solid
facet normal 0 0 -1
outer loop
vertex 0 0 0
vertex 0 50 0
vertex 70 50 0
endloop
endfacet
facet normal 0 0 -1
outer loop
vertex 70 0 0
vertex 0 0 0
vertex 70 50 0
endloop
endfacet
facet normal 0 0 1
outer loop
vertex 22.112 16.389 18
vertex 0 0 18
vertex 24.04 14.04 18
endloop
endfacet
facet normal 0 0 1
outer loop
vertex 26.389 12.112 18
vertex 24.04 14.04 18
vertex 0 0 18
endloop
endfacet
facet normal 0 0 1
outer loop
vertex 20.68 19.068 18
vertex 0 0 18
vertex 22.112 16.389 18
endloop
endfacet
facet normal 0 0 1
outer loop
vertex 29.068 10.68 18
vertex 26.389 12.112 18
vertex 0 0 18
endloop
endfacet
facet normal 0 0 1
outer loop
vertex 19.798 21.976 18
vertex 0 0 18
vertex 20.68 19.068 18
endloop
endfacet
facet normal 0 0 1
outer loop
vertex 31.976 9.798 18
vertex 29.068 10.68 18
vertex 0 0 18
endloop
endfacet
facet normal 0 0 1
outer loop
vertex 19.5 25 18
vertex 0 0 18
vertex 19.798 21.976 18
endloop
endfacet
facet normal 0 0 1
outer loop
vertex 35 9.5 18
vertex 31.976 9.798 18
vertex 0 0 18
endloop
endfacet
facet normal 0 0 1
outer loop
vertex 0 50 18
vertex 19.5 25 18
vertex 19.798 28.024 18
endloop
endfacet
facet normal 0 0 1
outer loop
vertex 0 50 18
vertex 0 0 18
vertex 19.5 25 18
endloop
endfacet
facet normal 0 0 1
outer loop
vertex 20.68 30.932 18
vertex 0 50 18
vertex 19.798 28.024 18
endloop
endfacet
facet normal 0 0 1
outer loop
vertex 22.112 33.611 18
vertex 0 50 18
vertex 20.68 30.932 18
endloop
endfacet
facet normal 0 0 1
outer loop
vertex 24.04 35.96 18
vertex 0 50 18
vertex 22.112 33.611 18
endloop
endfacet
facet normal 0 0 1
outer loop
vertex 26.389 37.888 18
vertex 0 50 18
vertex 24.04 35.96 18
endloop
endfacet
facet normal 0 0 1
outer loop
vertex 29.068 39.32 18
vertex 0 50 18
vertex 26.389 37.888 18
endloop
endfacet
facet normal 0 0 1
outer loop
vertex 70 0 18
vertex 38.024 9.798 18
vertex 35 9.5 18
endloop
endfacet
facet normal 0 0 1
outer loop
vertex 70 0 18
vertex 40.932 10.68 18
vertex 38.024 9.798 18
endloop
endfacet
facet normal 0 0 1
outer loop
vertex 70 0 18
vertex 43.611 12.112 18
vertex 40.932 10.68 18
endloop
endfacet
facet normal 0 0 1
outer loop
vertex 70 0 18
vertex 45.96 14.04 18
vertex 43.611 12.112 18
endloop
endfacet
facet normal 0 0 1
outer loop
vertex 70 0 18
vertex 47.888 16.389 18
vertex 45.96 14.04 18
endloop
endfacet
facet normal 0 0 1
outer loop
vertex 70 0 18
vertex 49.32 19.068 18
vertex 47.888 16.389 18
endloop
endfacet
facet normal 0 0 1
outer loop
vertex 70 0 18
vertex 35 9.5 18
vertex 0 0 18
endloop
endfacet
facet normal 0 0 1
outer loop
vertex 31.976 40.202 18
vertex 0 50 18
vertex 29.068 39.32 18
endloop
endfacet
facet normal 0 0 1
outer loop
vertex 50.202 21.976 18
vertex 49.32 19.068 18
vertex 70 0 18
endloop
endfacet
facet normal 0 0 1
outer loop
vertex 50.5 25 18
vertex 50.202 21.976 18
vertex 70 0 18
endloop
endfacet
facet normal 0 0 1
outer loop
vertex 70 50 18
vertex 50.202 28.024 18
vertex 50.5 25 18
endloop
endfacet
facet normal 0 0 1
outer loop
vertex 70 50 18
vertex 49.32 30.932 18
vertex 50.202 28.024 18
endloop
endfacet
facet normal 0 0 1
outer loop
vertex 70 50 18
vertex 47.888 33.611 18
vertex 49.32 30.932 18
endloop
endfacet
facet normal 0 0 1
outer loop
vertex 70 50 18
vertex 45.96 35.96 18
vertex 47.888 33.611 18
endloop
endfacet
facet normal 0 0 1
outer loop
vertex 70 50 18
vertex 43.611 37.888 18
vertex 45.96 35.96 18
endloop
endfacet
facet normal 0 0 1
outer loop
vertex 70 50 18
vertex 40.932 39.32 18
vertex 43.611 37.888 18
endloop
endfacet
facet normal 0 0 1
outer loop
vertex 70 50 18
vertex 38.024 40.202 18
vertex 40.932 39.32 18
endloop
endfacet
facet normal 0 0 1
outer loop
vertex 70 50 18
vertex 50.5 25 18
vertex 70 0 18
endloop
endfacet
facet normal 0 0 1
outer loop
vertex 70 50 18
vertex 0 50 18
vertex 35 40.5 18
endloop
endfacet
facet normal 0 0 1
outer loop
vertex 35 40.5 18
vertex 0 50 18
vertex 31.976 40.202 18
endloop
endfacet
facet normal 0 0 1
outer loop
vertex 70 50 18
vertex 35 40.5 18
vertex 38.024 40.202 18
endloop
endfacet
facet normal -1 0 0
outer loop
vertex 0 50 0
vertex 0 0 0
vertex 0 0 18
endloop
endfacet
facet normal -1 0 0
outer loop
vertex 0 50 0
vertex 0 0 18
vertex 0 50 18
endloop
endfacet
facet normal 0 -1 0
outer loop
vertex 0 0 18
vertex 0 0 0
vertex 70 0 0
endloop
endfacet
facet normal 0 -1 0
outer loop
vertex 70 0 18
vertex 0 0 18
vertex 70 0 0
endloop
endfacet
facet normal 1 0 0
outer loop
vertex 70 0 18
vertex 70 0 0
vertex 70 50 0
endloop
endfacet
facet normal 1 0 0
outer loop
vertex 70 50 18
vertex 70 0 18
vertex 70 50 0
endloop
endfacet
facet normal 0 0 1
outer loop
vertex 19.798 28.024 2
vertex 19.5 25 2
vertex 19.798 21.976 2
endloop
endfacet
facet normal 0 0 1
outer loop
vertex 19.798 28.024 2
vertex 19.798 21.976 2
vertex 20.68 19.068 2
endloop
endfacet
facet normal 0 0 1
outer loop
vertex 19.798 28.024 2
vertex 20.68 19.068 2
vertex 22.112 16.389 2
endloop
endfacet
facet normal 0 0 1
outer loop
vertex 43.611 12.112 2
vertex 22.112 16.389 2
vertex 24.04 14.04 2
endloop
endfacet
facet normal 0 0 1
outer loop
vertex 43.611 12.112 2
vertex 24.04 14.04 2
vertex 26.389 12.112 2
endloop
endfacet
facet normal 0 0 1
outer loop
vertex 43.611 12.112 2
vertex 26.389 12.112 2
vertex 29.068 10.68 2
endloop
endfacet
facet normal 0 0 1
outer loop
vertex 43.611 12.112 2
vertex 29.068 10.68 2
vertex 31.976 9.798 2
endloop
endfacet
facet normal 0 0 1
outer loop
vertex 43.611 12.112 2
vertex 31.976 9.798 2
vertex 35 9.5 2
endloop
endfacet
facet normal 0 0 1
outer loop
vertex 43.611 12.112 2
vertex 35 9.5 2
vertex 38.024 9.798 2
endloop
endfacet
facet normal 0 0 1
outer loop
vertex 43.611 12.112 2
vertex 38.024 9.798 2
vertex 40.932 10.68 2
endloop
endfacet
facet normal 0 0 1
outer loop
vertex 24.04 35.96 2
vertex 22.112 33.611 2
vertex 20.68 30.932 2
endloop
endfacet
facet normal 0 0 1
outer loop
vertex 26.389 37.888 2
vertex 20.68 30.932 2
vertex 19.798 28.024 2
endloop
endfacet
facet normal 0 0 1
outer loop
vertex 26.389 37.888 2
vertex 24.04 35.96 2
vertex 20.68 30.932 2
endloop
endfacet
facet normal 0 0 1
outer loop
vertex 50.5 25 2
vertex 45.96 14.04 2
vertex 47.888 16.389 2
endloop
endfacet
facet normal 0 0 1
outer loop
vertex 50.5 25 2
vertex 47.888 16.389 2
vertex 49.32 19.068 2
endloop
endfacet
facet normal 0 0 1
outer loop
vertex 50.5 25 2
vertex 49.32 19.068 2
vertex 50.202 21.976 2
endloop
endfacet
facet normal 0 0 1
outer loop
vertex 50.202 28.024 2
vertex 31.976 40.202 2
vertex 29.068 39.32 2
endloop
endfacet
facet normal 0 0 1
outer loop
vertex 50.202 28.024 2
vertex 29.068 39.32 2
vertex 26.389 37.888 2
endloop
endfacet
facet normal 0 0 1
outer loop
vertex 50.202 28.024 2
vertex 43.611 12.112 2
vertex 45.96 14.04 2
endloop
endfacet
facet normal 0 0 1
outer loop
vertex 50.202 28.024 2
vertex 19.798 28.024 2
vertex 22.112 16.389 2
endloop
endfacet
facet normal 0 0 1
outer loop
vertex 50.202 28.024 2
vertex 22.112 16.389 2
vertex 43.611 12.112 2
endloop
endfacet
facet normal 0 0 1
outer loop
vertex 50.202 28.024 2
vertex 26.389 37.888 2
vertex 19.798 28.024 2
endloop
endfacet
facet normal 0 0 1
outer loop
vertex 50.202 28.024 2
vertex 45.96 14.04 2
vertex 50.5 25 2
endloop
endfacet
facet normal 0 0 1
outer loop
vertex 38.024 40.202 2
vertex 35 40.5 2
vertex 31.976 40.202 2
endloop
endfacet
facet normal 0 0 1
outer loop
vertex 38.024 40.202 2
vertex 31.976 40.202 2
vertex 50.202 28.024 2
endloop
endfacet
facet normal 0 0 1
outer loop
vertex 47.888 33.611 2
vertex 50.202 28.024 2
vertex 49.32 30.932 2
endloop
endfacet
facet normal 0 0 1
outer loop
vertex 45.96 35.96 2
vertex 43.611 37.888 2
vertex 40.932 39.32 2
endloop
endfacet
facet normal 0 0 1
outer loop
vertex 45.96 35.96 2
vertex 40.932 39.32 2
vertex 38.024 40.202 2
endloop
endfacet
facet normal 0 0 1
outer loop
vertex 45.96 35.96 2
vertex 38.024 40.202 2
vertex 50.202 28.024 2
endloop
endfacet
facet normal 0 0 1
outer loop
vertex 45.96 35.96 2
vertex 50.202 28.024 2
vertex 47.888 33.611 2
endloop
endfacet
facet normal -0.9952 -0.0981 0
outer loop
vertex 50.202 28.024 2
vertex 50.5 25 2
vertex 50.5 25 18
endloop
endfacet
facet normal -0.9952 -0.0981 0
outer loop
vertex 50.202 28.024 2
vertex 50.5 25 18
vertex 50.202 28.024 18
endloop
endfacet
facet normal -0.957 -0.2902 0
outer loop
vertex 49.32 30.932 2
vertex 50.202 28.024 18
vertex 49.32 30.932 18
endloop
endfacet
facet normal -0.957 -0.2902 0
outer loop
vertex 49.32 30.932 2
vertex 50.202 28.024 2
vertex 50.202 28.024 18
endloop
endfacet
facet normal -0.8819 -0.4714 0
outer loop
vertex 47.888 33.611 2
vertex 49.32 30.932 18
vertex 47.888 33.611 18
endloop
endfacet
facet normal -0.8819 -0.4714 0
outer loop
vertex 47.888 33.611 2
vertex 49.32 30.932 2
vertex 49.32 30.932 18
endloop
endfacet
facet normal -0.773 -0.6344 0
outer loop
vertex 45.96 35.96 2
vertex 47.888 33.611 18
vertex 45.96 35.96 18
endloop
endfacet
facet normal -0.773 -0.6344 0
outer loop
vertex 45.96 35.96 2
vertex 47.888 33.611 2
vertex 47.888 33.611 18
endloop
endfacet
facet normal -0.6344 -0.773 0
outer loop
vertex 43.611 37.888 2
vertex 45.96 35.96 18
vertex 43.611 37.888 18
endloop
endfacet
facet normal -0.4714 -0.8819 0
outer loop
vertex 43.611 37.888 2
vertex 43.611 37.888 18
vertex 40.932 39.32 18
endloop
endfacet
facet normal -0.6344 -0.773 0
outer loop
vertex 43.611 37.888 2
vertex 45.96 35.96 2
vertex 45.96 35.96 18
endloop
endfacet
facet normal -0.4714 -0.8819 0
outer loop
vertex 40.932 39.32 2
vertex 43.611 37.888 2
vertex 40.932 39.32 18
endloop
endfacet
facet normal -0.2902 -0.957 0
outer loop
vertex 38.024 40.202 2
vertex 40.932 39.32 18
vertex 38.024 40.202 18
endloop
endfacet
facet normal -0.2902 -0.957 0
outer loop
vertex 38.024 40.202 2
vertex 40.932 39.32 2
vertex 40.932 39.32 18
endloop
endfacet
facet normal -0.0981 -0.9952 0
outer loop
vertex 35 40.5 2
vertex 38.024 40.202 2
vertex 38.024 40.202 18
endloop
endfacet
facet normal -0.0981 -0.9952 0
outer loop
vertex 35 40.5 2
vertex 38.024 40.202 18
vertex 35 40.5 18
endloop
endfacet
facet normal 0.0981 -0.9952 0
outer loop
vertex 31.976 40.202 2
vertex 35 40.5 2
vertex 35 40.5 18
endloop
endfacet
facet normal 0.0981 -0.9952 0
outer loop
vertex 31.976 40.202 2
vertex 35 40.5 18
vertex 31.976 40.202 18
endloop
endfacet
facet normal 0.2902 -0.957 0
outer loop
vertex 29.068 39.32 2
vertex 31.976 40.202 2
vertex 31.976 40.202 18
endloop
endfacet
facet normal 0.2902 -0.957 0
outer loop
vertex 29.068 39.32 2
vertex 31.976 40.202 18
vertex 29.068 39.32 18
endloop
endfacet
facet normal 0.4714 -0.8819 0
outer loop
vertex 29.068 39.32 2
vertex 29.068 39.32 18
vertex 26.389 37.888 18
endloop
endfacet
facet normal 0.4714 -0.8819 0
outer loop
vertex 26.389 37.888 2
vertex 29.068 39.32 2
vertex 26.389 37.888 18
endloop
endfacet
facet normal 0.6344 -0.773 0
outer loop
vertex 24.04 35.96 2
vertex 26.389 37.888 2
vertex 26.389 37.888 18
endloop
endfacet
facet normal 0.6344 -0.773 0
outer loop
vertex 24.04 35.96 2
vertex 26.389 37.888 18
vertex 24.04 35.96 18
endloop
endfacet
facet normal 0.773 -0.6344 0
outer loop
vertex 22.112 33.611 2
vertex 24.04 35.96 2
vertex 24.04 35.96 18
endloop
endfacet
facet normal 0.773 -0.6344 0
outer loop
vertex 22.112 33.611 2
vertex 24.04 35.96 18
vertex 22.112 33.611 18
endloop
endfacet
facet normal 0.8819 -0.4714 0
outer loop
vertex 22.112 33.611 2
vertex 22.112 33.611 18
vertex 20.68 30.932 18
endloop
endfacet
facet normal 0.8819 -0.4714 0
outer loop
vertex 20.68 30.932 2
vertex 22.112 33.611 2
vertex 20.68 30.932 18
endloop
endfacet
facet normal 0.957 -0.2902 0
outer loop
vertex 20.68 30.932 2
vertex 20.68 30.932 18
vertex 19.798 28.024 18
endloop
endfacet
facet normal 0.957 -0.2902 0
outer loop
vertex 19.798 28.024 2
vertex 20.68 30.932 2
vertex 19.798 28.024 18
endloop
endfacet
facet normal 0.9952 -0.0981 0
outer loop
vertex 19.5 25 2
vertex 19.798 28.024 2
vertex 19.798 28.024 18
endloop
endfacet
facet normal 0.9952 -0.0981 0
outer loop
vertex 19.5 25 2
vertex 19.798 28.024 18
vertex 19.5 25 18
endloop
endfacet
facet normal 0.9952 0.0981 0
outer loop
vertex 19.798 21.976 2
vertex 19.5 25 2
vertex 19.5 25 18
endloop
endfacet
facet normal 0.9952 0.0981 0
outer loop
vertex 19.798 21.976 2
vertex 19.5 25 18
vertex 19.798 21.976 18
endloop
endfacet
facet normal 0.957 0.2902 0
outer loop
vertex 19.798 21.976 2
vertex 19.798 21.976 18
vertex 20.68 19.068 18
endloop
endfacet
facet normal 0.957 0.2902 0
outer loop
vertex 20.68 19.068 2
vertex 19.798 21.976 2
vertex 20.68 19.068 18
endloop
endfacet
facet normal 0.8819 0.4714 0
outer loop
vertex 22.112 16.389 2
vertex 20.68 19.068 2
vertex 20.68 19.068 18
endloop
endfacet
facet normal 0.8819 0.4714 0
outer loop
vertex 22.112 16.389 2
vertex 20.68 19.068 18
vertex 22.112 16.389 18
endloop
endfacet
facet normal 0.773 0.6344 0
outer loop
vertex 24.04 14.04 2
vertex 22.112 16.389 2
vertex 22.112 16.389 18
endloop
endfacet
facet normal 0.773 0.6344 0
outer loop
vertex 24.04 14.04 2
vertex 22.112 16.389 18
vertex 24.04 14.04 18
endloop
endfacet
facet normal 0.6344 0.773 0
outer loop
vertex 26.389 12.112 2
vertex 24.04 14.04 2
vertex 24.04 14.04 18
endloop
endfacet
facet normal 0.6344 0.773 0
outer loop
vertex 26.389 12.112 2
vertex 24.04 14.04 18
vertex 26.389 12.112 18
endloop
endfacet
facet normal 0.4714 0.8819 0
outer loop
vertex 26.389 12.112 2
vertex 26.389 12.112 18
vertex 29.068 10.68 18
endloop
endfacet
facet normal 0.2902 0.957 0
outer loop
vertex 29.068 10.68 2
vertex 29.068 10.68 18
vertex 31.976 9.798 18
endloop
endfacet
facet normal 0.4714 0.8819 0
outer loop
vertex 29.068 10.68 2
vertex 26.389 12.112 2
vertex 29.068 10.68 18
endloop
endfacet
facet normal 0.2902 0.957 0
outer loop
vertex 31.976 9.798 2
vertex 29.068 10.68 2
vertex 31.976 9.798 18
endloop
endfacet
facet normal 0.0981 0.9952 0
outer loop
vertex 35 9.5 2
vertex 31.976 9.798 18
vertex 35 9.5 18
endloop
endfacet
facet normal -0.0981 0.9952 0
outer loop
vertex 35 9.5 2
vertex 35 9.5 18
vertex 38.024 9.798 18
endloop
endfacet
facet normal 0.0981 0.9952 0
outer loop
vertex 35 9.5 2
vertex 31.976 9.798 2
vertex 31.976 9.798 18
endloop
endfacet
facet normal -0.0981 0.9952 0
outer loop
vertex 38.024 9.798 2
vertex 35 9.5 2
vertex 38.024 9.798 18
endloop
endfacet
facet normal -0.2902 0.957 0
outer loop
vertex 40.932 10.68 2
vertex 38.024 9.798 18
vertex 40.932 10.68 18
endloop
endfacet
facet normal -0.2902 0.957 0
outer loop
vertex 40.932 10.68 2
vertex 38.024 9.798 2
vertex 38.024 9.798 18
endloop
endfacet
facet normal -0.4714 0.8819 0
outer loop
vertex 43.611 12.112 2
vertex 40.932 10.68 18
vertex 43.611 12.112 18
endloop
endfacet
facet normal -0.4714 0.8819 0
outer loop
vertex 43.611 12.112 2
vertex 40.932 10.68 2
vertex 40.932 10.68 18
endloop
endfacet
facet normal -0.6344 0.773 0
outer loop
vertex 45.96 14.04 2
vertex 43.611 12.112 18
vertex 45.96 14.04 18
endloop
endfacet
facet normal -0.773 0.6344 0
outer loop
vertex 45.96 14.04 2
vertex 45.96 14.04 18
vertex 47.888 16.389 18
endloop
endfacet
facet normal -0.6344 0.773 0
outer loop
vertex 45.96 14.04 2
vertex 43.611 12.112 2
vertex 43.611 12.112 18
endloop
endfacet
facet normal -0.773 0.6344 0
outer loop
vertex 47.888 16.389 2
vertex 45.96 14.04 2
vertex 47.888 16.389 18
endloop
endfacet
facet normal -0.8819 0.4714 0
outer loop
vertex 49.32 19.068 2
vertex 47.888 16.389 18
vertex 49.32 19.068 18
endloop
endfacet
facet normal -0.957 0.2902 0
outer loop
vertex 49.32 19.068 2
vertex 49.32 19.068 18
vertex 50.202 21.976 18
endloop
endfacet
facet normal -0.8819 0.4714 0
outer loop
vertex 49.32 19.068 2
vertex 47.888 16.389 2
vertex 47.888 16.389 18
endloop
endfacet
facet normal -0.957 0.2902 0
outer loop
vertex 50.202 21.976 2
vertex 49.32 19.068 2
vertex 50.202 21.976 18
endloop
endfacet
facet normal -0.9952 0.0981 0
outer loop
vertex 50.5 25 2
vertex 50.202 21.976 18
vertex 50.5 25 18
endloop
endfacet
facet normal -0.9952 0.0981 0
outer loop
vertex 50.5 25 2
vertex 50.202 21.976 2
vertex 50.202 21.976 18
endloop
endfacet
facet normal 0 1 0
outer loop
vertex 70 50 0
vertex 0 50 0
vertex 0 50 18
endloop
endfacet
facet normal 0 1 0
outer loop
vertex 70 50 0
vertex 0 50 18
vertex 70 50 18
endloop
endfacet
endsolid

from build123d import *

# Parameters (mm, degrees)
SKETCH_1_W      = 70
SKETCH_1_H      = 50
SKETCH_1_R      = 15.5
EXTRUDE_1_DEPTH = 18
SKETCH_2_R      = 15.5
EXTRUDE_2_DEPTH = 2


with BuildPart() as part:
    # 草图1 → 凸台-拉伸1 (new body)
    with BuildSketch(Plane.XY):
        with Locations((35, 25)):
            Rectangle(SKETCH_1_W, SKETCH_1_H)
        with Locations((35, 25)):
            Circle(SKETCH_1_R, mode=Mode.SUBTRACT)
    extrude(amount=EXTRUDE_1_DEPTH)

    # 草图2 → 凸台-拉伸2 (add)
    with BuildSketch(Plane.XY):
        with Locations((35, 25)):
            Circle(SKETCH_2_R)
    extrude(amount=EXTRUDE_2_DEPTH)


solid = part.part
